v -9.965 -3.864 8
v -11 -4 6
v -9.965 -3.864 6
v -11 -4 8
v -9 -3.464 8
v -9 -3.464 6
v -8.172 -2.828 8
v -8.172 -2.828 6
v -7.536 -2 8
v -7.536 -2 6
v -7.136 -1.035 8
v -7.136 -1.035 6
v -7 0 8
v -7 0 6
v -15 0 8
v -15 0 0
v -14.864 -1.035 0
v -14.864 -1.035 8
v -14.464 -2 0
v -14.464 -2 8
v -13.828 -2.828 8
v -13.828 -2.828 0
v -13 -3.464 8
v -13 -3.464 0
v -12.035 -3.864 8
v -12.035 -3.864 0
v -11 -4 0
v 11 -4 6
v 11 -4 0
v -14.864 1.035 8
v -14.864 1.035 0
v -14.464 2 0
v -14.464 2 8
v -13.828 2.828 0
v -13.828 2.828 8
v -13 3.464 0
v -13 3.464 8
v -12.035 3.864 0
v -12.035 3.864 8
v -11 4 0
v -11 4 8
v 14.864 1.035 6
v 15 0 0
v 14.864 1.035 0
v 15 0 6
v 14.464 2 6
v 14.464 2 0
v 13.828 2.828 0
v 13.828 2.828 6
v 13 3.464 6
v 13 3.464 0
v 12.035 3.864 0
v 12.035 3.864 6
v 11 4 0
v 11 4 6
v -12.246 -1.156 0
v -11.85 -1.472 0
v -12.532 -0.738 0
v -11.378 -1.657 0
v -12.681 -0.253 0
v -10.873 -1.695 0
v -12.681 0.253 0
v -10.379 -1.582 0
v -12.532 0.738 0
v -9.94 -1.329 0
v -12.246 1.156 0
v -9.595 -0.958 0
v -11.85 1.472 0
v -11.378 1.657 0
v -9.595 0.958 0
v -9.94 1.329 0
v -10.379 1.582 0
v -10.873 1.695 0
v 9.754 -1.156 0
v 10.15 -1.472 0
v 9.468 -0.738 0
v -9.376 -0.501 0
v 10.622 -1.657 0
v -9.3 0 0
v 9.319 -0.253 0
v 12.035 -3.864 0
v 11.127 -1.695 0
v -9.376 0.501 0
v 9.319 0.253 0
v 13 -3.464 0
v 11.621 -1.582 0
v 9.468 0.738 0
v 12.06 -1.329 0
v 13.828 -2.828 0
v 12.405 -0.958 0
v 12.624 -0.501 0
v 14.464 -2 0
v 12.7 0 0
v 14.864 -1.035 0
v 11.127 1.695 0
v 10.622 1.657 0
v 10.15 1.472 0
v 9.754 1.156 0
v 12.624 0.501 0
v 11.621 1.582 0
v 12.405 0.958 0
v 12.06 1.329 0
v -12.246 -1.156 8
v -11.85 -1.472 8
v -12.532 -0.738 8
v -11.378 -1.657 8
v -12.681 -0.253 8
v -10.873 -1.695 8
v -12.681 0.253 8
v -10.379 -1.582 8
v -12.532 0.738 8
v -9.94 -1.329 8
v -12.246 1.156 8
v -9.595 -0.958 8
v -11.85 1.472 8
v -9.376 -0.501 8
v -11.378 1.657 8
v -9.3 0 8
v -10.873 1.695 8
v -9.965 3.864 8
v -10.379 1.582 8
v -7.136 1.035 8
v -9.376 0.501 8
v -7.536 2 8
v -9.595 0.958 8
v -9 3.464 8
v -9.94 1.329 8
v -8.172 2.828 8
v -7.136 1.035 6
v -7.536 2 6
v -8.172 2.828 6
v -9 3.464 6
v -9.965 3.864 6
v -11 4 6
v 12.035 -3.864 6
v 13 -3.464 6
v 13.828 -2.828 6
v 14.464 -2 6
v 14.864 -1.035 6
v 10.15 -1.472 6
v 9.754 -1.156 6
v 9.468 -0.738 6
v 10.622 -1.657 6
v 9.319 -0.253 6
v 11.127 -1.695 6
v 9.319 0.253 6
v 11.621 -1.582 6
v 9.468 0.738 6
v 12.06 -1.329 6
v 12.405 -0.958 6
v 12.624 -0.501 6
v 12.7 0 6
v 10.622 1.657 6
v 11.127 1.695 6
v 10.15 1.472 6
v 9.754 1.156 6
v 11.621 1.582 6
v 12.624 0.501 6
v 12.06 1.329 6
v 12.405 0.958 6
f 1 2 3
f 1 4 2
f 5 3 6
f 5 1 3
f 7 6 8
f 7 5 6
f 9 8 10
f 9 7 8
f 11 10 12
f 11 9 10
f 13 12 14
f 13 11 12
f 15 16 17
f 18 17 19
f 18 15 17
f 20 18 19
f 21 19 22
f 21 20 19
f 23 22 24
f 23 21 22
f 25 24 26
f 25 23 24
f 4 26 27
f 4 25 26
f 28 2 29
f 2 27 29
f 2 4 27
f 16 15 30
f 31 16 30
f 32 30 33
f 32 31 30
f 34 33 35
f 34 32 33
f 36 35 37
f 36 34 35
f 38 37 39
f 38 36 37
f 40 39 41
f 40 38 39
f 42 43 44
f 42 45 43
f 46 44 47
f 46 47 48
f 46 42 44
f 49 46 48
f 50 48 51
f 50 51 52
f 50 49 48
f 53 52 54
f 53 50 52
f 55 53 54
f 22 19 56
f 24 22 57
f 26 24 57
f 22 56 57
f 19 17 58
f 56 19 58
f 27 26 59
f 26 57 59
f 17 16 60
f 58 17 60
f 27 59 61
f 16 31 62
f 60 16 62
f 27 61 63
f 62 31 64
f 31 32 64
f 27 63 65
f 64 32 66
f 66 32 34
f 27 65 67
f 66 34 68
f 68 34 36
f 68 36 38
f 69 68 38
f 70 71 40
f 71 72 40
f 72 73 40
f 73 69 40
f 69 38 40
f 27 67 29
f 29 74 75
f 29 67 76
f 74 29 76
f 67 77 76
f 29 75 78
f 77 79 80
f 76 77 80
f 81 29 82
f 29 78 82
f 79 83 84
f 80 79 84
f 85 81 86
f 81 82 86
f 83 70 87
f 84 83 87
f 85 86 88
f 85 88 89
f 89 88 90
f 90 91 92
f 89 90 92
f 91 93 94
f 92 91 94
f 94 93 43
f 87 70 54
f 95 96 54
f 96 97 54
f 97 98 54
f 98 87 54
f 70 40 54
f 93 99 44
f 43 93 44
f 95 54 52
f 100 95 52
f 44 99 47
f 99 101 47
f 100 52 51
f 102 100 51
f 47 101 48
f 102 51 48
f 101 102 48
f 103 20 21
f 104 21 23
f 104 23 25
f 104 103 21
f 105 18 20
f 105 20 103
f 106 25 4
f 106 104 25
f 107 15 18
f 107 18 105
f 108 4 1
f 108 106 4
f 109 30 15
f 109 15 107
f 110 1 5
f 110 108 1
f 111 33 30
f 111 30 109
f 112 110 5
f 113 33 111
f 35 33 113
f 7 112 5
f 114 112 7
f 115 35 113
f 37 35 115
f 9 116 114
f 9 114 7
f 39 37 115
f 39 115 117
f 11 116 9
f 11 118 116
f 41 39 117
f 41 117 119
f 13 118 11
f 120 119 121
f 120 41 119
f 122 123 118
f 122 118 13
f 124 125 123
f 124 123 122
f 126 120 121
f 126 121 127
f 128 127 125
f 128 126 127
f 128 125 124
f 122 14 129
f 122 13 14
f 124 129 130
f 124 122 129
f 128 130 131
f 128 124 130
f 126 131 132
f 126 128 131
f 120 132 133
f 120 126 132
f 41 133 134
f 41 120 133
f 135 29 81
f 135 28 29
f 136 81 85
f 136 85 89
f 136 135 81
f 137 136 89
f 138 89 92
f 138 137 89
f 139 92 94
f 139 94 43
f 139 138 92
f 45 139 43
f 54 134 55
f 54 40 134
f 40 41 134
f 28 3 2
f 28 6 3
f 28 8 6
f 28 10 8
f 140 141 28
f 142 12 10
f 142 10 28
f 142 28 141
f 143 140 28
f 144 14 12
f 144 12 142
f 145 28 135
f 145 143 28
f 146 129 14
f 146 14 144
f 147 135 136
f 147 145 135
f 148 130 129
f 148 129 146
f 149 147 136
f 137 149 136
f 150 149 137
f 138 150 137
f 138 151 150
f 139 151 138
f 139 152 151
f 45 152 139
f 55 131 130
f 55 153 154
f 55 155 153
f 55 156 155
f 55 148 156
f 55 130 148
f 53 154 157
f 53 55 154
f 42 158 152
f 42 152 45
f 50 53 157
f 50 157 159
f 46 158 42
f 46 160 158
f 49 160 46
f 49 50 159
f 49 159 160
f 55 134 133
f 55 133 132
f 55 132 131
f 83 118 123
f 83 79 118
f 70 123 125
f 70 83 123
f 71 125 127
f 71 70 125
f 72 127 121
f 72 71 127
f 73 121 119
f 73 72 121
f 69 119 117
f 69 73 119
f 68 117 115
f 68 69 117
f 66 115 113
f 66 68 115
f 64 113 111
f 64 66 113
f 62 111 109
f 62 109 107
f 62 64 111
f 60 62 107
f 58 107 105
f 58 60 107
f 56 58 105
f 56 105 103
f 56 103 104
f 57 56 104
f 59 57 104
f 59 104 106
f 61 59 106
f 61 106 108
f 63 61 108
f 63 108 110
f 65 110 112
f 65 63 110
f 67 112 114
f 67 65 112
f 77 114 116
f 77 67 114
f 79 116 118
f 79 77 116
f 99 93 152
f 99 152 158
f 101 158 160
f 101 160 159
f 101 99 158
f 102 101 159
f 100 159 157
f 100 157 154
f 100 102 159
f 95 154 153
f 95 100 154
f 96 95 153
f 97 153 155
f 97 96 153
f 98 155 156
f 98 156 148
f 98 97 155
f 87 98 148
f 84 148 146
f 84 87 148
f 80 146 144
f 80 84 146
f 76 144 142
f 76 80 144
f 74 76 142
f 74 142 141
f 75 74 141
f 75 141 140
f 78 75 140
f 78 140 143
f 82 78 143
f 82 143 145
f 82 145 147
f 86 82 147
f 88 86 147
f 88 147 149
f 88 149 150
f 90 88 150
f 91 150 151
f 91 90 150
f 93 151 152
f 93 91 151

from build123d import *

# Parameters (mm, degrees)
F0_W     = 30
F0_H     = 8
F0_R     = 1.7
F1_DEPTH = 6
F2_W     = 8
F2_H     = 8
F2_R     = 1.7
F3_DEPTH = 2
F4_R     = 3.99999


# Not quite as in the source:
# - a fillet or chamfer is up to 0.001 mm smaller than in the source, because OpenCascade refuses the exact size


with BuildPart() as f1:
    # F0 (on Top) → F1 (new body)
    with BuildSketch(Plane.XY):
        Rectangle(F0_W, F0_H)
        with Locations((-11, 0)):
            Circle(F0_R, mode=Mode.SUBTRACT)
        with Locations((11, 0)):
            Circle(F0_R, mode=Mode.SUBTRACT)
    extrude(amount=F1_DEPTH)

    # F2 (on face) → F3 (join)
    with BuildSketch(Plane.XY.offset(6)):
        with Locations((-11, 0)):
            Rectangle(F2_W, F2_H)
        with Locations((-11, 0)):
            Circle(F2_R, mode=Mode.SUBTRACT)
    extrude(amount=F3_DEPTH)

    # F4 (radius 4 in the source; OpenCascade refuses exactly that, so slightly less here)
    f4_edges = [f1.edges().sort_by_distance(p)[0] for p in [
        (-15, 4, 4),
        (-15, -4, 4),
        (15, 4, 3),
        (15, -4, 3),
        (-7, -4, 7),
        (-7, 4, 7),
    ]]
    fillet(f4_edges, radius=F4_R)


solid = f1.part
